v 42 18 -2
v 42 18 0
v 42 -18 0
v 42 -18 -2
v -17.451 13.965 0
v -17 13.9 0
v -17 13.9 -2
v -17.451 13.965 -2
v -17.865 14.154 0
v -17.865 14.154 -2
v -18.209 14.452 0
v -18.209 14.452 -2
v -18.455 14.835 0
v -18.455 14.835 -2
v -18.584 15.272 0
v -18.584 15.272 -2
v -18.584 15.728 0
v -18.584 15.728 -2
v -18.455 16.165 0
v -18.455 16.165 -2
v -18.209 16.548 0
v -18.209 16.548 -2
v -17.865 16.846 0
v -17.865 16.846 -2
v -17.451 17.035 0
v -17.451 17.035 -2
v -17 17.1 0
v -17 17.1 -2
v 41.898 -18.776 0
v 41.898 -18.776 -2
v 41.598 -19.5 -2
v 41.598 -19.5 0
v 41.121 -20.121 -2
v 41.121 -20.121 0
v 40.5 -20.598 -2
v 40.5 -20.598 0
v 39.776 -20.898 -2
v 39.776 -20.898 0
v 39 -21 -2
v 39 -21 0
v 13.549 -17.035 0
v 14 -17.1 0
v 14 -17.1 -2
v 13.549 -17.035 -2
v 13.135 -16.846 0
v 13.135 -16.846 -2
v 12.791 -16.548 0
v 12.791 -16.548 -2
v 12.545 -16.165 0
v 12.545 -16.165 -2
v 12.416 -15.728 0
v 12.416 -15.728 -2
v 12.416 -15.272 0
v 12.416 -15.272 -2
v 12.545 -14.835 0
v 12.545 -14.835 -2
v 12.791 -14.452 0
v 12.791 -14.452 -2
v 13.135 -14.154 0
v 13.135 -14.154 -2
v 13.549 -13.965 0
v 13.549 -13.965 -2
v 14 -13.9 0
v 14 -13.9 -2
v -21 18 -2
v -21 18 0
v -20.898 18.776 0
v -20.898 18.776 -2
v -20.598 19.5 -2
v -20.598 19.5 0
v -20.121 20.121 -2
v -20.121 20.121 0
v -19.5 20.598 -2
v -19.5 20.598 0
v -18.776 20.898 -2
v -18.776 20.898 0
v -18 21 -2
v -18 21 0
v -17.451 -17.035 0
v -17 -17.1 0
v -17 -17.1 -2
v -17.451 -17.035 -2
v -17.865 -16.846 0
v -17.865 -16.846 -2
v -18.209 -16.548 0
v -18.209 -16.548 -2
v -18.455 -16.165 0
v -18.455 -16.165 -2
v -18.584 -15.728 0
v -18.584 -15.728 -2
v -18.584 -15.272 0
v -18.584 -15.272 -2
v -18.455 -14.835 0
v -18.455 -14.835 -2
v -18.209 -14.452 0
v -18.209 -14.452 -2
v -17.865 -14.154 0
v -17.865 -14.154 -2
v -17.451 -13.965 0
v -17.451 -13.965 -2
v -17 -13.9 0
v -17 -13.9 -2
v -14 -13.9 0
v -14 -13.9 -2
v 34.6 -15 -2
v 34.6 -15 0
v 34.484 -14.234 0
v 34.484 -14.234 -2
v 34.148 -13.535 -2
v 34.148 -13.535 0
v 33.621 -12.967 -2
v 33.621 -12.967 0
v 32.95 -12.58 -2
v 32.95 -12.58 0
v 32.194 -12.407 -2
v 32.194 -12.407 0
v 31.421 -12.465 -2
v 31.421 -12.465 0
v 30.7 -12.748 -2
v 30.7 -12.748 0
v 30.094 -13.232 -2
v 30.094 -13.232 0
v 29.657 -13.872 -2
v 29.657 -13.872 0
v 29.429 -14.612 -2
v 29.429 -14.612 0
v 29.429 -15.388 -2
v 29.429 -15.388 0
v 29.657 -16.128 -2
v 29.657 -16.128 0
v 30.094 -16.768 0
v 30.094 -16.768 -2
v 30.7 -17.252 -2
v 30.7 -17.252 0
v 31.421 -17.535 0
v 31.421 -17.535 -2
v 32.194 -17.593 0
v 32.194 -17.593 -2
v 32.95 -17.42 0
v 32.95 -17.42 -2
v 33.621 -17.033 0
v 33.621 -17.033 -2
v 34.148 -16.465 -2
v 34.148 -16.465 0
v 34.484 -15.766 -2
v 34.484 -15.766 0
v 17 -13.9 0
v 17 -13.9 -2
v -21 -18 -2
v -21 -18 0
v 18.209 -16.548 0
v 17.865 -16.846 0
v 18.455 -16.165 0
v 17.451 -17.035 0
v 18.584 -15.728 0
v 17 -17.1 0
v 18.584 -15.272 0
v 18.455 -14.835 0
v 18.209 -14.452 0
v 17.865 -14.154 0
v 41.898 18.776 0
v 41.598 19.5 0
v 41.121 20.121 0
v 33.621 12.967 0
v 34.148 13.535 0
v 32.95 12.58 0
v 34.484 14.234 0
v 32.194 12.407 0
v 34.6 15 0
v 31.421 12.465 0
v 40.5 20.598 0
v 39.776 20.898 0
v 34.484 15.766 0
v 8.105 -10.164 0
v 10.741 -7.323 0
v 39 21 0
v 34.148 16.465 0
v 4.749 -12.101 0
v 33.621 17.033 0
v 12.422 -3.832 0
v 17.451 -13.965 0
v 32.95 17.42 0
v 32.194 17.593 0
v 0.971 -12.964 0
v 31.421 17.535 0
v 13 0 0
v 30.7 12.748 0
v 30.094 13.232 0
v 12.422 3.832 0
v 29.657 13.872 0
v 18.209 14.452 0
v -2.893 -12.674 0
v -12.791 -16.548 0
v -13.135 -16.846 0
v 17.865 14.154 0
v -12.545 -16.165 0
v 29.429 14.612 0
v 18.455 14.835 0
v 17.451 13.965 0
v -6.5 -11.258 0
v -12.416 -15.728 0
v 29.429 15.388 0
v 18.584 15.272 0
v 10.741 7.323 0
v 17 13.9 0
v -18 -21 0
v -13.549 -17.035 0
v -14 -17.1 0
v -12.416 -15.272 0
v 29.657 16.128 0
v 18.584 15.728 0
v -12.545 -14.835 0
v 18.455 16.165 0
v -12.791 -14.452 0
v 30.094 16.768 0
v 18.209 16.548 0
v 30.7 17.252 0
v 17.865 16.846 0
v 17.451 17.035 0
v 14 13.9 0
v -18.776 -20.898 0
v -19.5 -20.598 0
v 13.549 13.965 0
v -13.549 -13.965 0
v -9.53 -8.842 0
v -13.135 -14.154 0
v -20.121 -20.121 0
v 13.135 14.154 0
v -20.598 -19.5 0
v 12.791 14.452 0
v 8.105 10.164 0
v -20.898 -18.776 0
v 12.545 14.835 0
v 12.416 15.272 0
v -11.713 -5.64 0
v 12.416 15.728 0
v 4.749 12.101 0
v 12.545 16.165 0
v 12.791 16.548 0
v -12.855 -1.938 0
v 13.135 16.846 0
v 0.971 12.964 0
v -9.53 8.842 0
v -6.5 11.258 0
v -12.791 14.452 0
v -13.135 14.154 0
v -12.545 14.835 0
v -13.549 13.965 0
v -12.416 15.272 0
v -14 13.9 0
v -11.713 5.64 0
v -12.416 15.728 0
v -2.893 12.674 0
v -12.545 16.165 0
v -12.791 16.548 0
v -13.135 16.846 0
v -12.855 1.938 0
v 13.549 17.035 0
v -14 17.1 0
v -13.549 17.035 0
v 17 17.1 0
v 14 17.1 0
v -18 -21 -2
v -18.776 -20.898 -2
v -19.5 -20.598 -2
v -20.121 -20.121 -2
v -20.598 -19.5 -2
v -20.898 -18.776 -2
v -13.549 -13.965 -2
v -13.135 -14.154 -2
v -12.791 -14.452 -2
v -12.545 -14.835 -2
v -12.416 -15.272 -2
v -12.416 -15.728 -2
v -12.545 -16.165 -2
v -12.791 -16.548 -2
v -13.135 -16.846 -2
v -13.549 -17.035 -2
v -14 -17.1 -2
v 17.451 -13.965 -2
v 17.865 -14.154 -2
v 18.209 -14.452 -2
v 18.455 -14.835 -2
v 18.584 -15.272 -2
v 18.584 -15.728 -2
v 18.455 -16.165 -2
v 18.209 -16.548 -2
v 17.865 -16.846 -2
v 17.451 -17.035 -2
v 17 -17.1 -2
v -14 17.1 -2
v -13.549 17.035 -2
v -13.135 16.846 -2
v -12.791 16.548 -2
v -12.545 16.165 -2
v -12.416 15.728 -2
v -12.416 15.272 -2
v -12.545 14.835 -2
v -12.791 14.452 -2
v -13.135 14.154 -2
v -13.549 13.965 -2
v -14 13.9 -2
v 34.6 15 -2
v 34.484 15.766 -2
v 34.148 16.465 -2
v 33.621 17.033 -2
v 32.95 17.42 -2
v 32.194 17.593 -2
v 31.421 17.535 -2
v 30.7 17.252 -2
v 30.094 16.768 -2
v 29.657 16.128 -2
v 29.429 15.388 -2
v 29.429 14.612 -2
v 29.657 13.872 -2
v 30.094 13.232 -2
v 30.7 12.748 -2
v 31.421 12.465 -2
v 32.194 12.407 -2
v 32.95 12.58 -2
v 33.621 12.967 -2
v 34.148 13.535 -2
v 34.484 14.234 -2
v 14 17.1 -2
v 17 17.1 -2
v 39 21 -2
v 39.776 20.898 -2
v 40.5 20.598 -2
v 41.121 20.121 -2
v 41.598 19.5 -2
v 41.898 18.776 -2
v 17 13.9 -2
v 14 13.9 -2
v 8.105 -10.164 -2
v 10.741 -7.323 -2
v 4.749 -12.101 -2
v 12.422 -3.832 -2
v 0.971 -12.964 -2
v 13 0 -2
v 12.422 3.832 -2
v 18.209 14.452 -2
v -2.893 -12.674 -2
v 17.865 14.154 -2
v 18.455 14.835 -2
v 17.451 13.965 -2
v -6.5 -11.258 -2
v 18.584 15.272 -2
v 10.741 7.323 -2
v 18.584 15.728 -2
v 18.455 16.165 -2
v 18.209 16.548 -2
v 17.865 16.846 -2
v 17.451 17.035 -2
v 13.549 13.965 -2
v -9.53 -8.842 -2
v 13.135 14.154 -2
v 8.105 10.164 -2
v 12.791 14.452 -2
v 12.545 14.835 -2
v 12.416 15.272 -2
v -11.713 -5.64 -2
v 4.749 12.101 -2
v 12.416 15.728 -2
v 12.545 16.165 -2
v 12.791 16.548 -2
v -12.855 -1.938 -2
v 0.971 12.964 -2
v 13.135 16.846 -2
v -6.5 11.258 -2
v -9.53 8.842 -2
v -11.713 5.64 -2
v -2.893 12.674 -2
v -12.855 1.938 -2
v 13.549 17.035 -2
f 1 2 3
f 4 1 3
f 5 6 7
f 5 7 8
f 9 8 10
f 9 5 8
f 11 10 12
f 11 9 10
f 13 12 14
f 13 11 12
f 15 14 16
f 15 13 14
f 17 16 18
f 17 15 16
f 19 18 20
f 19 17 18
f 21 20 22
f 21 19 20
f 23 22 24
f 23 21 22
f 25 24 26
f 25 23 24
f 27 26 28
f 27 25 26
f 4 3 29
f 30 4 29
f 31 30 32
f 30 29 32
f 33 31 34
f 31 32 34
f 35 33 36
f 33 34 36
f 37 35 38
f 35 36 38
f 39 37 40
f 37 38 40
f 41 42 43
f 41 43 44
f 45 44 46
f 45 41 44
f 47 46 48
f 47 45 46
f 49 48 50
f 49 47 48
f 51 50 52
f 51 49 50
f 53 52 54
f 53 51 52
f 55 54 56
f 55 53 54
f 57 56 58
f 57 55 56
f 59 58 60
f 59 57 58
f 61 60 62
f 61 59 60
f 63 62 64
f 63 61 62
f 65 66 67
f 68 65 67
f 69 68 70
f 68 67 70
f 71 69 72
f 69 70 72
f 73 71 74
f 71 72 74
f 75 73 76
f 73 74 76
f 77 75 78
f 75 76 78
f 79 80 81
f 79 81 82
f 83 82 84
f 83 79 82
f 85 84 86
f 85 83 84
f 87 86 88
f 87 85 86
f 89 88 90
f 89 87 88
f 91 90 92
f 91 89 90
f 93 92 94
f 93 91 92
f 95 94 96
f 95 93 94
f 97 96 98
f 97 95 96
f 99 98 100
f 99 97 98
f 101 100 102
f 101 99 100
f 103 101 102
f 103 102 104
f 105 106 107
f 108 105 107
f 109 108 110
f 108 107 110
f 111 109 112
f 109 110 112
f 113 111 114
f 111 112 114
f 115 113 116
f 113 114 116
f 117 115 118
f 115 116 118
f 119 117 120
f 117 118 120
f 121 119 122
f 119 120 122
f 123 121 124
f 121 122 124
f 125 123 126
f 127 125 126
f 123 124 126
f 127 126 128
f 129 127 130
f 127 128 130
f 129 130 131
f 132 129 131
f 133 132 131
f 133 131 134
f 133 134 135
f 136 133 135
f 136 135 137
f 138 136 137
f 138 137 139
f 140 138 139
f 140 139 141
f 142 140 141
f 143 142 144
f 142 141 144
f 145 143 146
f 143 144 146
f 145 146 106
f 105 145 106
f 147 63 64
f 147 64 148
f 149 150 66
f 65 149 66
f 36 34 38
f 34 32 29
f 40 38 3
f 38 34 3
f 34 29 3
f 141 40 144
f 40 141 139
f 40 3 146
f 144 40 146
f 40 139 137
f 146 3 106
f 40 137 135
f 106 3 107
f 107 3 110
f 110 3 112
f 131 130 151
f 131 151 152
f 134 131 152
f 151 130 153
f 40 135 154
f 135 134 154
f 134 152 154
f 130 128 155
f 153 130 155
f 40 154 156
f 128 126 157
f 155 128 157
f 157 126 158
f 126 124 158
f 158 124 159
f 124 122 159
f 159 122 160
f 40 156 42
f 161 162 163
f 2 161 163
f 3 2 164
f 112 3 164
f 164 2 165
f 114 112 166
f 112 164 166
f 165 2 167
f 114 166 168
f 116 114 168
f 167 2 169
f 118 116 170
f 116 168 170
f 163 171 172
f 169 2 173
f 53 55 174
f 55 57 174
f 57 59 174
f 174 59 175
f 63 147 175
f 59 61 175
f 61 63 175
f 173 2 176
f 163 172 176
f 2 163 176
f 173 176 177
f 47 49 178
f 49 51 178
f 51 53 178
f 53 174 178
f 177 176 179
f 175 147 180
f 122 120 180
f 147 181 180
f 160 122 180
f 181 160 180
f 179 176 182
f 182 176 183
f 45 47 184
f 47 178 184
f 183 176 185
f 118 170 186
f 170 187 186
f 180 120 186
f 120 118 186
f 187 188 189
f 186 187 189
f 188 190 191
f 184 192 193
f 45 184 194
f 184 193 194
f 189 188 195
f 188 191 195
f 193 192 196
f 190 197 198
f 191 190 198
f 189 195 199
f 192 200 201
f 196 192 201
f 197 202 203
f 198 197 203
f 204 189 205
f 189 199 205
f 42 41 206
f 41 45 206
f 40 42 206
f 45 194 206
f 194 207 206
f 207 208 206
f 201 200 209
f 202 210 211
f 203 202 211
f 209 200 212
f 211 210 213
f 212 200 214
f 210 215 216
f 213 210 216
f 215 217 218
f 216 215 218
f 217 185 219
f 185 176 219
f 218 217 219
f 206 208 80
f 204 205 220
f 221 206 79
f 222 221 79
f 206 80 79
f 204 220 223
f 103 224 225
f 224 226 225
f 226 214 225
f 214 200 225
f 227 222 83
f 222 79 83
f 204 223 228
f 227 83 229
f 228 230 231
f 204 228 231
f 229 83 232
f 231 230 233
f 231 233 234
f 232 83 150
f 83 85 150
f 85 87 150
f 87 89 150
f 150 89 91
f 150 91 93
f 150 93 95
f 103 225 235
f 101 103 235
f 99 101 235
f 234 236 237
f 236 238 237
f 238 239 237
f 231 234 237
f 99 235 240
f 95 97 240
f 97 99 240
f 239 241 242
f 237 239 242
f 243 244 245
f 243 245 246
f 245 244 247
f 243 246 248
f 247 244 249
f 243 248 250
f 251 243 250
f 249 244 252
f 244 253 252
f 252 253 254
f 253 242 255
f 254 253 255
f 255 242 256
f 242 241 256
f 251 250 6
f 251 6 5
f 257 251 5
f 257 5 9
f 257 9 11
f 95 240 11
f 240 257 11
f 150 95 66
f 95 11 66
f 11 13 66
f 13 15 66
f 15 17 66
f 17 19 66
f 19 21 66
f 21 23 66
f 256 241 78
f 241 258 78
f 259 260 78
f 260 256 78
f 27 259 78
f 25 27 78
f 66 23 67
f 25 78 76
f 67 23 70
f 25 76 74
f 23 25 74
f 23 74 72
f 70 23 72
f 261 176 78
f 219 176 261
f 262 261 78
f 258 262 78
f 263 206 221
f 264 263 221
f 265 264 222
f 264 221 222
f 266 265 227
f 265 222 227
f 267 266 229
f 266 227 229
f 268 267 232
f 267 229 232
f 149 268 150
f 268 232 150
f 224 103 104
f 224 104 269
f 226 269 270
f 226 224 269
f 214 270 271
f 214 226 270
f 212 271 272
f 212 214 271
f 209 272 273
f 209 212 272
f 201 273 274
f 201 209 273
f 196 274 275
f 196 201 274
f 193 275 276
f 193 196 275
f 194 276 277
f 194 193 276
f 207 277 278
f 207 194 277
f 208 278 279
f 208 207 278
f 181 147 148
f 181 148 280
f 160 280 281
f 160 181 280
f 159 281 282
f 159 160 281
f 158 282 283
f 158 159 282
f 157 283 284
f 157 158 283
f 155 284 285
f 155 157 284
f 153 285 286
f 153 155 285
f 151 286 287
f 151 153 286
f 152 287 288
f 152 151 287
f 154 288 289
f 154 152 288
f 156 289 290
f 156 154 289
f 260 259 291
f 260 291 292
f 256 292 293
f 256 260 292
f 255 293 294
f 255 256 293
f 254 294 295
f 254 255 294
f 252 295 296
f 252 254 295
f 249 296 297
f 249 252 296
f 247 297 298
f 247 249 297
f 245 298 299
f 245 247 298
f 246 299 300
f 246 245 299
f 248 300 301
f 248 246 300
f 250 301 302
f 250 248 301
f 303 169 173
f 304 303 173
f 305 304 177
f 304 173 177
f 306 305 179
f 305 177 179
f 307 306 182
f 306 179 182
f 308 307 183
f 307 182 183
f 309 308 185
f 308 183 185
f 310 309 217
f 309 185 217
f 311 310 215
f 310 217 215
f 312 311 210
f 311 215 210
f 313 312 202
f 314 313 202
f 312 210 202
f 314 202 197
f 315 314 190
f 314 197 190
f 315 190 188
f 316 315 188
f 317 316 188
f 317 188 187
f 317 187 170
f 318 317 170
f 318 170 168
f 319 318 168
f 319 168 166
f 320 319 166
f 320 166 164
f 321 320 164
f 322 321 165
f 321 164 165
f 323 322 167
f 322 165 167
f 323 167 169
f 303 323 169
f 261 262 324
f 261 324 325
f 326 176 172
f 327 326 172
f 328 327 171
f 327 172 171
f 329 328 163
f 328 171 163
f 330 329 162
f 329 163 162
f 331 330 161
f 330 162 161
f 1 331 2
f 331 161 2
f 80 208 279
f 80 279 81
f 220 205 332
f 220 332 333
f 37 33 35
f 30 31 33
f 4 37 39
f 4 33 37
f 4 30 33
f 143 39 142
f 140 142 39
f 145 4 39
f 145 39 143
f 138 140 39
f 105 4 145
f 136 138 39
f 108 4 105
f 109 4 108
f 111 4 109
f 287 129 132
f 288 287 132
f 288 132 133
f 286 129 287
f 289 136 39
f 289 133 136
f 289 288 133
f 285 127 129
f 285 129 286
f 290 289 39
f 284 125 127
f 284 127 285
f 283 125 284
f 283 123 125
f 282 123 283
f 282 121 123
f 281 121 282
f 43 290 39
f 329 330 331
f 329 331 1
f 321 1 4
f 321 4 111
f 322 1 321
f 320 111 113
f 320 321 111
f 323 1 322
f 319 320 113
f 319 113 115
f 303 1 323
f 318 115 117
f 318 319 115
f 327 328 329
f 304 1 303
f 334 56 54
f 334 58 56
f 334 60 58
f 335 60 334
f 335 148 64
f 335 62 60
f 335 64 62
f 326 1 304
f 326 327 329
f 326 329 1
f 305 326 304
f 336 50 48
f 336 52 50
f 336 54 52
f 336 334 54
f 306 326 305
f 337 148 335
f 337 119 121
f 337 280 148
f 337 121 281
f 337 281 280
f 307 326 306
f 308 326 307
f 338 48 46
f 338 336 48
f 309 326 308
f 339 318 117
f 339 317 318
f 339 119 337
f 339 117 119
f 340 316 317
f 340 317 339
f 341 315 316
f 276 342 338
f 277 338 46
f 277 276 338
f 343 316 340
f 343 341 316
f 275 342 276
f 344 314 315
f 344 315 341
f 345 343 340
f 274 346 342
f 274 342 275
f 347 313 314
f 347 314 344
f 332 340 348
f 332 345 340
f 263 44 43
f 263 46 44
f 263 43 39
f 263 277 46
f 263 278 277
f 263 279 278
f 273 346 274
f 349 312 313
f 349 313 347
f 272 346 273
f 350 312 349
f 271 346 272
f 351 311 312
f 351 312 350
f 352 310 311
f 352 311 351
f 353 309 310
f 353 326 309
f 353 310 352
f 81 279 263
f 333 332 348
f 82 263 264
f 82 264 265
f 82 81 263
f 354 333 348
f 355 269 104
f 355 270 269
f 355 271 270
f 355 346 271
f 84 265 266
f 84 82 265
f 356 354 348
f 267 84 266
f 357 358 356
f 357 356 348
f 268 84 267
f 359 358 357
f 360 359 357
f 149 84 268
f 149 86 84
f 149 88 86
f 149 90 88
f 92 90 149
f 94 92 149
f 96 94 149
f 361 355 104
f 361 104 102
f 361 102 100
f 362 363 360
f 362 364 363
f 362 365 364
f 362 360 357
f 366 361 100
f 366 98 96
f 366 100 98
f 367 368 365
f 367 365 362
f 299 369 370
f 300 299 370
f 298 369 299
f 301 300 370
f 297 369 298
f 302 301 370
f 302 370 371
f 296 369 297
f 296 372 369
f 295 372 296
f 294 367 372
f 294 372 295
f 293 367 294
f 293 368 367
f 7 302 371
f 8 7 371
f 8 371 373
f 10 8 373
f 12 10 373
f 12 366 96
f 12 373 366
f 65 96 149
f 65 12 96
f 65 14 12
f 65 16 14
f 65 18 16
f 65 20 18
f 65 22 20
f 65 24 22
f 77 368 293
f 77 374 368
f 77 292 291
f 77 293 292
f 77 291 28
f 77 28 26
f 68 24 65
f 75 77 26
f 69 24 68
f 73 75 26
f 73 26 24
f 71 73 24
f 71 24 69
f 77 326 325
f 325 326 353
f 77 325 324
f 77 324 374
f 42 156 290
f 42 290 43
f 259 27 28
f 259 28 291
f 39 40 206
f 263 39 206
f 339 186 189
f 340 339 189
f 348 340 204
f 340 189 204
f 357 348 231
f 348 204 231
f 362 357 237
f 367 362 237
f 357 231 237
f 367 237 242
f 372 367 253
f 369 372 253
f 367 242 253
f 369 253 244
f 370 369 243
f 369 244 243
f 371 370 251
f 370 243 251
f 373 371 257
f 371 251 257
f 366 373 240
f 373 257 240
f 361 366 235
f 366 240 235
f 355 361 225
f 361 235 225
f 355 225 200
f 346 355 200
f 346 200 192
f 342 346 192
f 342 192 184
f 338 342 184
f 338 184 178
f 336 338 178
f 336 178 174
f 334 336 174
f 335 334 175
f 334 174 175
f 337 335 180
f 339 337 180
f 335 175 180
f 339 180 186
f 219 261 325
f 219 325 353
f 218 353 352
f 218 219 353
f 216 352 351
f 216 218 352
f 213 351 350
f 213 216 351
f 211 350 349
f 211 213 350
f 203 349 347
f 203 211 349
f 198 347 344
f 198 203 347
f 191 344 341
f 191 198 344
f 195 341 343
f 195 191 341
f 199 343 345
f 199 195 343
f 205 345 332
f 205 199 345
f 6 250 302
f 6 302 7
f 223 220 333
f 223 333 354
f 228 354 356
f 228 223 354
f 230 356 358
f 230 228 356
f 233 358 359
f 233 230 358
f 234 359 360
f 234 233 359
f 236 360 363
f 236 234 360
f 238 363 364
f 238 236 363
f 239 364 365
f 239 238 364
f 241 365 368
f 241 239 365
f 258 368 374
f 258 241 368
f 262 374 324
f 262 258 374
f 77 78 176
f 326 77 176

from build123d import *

# Parameters (mm, degrees)
SKETCH_1_R             = 13
SKETCH_1_R_2           = 2.6
SM_BASE_FLANGE_1_DEPTH = 2


# Sheet-metal steps are written as plain solids
with BuildPart() as part:
    # Sketch 1 → 基体-法兰1 (new body)
    with BuildSketch(Plane.XY):
        with BuildLine():
            Line((42, 18), (42, -18))
            ThreePointArc((42, -18), (41.121320344, -20.121320344), (39, -21))
            Line((39, -21), (-18, -21))
            ThreePointArc((-18, -21), (-20.121320344, -20.121320344), (-21, -18))
            Line((-21, -18), (-21, 18))
            ThreePointArc((-21, 18), (-20.121320344, 20.121320344), (-18, 21))
            Line((-18, 21), (39, 21))
            ThreePointArc((39, 21), (41.121320344, 20.121320344), (42, 18))
        make_face()
        Circle(SKETCH_1_R, mode=Mode.SUBTRACT)
        with Locations((32, 15)):
            Circle(SKETCH_1_R_2, mode=Mode.SUBTRACT)
        with Locations((32, -15)):
            Circle(SKETCH_1_R_2, mode=Mode.SUBTRACT)
        with BuildLine():
            Line((-14, 13.9), (-17, 13.9))
            ThreePointArc((-17, 13.9), (-18.6, 15.5), (-17, 17.1))
            Line((-17, 17.1), (-14, 17.1))
            ThreePointArc((-14, 17.1), (-12.4, 15.5), (-14, 13.9))
        make_face(mode=Mode.SUBTRACT)
        with BuildLine():
            Line((-14, -17.1), (-17, -17.1))
            ThreePointArc((-17, -17.1), (-18.6, -15.5), (-17, -13.9))
            Line((-17, -13.9), (-14, -13.9))
            ThreePointArc((-14, -13.9), (-12.4, -15.5), (-14, -17.1))
        make_face(mode=Mode.SUBTRACT)
        with BuildLine():
            Line((17, 13.9), (14, 13.9))
            ThreePointArc((14, 13.9), (12.4, 15.5), (14, 17.1))
            Line((14, 17.1), (17, 17.1))
            ThreePointArc((17, 17.1), (18.6, 15.5), (17, 13.9))
        make_face(mode=Mode.SUBTRACT)
        with BuildLine():
            Line((17, -17.1), (14, -17.1))
            ThreePointArc((14, -17.1), (12.4, -15.5), (14, -13.9))
            Line((14, -13.9), (17, -13.9))
            ThreePointArc((17, -13.9), (18.6, -15.5), (17, -17.1))
        make_face(mode=Mode.SUBTRACT)
    extrude(amount=-SM_BASE_FLANGE_1_DEPTH)


solid = part.part
